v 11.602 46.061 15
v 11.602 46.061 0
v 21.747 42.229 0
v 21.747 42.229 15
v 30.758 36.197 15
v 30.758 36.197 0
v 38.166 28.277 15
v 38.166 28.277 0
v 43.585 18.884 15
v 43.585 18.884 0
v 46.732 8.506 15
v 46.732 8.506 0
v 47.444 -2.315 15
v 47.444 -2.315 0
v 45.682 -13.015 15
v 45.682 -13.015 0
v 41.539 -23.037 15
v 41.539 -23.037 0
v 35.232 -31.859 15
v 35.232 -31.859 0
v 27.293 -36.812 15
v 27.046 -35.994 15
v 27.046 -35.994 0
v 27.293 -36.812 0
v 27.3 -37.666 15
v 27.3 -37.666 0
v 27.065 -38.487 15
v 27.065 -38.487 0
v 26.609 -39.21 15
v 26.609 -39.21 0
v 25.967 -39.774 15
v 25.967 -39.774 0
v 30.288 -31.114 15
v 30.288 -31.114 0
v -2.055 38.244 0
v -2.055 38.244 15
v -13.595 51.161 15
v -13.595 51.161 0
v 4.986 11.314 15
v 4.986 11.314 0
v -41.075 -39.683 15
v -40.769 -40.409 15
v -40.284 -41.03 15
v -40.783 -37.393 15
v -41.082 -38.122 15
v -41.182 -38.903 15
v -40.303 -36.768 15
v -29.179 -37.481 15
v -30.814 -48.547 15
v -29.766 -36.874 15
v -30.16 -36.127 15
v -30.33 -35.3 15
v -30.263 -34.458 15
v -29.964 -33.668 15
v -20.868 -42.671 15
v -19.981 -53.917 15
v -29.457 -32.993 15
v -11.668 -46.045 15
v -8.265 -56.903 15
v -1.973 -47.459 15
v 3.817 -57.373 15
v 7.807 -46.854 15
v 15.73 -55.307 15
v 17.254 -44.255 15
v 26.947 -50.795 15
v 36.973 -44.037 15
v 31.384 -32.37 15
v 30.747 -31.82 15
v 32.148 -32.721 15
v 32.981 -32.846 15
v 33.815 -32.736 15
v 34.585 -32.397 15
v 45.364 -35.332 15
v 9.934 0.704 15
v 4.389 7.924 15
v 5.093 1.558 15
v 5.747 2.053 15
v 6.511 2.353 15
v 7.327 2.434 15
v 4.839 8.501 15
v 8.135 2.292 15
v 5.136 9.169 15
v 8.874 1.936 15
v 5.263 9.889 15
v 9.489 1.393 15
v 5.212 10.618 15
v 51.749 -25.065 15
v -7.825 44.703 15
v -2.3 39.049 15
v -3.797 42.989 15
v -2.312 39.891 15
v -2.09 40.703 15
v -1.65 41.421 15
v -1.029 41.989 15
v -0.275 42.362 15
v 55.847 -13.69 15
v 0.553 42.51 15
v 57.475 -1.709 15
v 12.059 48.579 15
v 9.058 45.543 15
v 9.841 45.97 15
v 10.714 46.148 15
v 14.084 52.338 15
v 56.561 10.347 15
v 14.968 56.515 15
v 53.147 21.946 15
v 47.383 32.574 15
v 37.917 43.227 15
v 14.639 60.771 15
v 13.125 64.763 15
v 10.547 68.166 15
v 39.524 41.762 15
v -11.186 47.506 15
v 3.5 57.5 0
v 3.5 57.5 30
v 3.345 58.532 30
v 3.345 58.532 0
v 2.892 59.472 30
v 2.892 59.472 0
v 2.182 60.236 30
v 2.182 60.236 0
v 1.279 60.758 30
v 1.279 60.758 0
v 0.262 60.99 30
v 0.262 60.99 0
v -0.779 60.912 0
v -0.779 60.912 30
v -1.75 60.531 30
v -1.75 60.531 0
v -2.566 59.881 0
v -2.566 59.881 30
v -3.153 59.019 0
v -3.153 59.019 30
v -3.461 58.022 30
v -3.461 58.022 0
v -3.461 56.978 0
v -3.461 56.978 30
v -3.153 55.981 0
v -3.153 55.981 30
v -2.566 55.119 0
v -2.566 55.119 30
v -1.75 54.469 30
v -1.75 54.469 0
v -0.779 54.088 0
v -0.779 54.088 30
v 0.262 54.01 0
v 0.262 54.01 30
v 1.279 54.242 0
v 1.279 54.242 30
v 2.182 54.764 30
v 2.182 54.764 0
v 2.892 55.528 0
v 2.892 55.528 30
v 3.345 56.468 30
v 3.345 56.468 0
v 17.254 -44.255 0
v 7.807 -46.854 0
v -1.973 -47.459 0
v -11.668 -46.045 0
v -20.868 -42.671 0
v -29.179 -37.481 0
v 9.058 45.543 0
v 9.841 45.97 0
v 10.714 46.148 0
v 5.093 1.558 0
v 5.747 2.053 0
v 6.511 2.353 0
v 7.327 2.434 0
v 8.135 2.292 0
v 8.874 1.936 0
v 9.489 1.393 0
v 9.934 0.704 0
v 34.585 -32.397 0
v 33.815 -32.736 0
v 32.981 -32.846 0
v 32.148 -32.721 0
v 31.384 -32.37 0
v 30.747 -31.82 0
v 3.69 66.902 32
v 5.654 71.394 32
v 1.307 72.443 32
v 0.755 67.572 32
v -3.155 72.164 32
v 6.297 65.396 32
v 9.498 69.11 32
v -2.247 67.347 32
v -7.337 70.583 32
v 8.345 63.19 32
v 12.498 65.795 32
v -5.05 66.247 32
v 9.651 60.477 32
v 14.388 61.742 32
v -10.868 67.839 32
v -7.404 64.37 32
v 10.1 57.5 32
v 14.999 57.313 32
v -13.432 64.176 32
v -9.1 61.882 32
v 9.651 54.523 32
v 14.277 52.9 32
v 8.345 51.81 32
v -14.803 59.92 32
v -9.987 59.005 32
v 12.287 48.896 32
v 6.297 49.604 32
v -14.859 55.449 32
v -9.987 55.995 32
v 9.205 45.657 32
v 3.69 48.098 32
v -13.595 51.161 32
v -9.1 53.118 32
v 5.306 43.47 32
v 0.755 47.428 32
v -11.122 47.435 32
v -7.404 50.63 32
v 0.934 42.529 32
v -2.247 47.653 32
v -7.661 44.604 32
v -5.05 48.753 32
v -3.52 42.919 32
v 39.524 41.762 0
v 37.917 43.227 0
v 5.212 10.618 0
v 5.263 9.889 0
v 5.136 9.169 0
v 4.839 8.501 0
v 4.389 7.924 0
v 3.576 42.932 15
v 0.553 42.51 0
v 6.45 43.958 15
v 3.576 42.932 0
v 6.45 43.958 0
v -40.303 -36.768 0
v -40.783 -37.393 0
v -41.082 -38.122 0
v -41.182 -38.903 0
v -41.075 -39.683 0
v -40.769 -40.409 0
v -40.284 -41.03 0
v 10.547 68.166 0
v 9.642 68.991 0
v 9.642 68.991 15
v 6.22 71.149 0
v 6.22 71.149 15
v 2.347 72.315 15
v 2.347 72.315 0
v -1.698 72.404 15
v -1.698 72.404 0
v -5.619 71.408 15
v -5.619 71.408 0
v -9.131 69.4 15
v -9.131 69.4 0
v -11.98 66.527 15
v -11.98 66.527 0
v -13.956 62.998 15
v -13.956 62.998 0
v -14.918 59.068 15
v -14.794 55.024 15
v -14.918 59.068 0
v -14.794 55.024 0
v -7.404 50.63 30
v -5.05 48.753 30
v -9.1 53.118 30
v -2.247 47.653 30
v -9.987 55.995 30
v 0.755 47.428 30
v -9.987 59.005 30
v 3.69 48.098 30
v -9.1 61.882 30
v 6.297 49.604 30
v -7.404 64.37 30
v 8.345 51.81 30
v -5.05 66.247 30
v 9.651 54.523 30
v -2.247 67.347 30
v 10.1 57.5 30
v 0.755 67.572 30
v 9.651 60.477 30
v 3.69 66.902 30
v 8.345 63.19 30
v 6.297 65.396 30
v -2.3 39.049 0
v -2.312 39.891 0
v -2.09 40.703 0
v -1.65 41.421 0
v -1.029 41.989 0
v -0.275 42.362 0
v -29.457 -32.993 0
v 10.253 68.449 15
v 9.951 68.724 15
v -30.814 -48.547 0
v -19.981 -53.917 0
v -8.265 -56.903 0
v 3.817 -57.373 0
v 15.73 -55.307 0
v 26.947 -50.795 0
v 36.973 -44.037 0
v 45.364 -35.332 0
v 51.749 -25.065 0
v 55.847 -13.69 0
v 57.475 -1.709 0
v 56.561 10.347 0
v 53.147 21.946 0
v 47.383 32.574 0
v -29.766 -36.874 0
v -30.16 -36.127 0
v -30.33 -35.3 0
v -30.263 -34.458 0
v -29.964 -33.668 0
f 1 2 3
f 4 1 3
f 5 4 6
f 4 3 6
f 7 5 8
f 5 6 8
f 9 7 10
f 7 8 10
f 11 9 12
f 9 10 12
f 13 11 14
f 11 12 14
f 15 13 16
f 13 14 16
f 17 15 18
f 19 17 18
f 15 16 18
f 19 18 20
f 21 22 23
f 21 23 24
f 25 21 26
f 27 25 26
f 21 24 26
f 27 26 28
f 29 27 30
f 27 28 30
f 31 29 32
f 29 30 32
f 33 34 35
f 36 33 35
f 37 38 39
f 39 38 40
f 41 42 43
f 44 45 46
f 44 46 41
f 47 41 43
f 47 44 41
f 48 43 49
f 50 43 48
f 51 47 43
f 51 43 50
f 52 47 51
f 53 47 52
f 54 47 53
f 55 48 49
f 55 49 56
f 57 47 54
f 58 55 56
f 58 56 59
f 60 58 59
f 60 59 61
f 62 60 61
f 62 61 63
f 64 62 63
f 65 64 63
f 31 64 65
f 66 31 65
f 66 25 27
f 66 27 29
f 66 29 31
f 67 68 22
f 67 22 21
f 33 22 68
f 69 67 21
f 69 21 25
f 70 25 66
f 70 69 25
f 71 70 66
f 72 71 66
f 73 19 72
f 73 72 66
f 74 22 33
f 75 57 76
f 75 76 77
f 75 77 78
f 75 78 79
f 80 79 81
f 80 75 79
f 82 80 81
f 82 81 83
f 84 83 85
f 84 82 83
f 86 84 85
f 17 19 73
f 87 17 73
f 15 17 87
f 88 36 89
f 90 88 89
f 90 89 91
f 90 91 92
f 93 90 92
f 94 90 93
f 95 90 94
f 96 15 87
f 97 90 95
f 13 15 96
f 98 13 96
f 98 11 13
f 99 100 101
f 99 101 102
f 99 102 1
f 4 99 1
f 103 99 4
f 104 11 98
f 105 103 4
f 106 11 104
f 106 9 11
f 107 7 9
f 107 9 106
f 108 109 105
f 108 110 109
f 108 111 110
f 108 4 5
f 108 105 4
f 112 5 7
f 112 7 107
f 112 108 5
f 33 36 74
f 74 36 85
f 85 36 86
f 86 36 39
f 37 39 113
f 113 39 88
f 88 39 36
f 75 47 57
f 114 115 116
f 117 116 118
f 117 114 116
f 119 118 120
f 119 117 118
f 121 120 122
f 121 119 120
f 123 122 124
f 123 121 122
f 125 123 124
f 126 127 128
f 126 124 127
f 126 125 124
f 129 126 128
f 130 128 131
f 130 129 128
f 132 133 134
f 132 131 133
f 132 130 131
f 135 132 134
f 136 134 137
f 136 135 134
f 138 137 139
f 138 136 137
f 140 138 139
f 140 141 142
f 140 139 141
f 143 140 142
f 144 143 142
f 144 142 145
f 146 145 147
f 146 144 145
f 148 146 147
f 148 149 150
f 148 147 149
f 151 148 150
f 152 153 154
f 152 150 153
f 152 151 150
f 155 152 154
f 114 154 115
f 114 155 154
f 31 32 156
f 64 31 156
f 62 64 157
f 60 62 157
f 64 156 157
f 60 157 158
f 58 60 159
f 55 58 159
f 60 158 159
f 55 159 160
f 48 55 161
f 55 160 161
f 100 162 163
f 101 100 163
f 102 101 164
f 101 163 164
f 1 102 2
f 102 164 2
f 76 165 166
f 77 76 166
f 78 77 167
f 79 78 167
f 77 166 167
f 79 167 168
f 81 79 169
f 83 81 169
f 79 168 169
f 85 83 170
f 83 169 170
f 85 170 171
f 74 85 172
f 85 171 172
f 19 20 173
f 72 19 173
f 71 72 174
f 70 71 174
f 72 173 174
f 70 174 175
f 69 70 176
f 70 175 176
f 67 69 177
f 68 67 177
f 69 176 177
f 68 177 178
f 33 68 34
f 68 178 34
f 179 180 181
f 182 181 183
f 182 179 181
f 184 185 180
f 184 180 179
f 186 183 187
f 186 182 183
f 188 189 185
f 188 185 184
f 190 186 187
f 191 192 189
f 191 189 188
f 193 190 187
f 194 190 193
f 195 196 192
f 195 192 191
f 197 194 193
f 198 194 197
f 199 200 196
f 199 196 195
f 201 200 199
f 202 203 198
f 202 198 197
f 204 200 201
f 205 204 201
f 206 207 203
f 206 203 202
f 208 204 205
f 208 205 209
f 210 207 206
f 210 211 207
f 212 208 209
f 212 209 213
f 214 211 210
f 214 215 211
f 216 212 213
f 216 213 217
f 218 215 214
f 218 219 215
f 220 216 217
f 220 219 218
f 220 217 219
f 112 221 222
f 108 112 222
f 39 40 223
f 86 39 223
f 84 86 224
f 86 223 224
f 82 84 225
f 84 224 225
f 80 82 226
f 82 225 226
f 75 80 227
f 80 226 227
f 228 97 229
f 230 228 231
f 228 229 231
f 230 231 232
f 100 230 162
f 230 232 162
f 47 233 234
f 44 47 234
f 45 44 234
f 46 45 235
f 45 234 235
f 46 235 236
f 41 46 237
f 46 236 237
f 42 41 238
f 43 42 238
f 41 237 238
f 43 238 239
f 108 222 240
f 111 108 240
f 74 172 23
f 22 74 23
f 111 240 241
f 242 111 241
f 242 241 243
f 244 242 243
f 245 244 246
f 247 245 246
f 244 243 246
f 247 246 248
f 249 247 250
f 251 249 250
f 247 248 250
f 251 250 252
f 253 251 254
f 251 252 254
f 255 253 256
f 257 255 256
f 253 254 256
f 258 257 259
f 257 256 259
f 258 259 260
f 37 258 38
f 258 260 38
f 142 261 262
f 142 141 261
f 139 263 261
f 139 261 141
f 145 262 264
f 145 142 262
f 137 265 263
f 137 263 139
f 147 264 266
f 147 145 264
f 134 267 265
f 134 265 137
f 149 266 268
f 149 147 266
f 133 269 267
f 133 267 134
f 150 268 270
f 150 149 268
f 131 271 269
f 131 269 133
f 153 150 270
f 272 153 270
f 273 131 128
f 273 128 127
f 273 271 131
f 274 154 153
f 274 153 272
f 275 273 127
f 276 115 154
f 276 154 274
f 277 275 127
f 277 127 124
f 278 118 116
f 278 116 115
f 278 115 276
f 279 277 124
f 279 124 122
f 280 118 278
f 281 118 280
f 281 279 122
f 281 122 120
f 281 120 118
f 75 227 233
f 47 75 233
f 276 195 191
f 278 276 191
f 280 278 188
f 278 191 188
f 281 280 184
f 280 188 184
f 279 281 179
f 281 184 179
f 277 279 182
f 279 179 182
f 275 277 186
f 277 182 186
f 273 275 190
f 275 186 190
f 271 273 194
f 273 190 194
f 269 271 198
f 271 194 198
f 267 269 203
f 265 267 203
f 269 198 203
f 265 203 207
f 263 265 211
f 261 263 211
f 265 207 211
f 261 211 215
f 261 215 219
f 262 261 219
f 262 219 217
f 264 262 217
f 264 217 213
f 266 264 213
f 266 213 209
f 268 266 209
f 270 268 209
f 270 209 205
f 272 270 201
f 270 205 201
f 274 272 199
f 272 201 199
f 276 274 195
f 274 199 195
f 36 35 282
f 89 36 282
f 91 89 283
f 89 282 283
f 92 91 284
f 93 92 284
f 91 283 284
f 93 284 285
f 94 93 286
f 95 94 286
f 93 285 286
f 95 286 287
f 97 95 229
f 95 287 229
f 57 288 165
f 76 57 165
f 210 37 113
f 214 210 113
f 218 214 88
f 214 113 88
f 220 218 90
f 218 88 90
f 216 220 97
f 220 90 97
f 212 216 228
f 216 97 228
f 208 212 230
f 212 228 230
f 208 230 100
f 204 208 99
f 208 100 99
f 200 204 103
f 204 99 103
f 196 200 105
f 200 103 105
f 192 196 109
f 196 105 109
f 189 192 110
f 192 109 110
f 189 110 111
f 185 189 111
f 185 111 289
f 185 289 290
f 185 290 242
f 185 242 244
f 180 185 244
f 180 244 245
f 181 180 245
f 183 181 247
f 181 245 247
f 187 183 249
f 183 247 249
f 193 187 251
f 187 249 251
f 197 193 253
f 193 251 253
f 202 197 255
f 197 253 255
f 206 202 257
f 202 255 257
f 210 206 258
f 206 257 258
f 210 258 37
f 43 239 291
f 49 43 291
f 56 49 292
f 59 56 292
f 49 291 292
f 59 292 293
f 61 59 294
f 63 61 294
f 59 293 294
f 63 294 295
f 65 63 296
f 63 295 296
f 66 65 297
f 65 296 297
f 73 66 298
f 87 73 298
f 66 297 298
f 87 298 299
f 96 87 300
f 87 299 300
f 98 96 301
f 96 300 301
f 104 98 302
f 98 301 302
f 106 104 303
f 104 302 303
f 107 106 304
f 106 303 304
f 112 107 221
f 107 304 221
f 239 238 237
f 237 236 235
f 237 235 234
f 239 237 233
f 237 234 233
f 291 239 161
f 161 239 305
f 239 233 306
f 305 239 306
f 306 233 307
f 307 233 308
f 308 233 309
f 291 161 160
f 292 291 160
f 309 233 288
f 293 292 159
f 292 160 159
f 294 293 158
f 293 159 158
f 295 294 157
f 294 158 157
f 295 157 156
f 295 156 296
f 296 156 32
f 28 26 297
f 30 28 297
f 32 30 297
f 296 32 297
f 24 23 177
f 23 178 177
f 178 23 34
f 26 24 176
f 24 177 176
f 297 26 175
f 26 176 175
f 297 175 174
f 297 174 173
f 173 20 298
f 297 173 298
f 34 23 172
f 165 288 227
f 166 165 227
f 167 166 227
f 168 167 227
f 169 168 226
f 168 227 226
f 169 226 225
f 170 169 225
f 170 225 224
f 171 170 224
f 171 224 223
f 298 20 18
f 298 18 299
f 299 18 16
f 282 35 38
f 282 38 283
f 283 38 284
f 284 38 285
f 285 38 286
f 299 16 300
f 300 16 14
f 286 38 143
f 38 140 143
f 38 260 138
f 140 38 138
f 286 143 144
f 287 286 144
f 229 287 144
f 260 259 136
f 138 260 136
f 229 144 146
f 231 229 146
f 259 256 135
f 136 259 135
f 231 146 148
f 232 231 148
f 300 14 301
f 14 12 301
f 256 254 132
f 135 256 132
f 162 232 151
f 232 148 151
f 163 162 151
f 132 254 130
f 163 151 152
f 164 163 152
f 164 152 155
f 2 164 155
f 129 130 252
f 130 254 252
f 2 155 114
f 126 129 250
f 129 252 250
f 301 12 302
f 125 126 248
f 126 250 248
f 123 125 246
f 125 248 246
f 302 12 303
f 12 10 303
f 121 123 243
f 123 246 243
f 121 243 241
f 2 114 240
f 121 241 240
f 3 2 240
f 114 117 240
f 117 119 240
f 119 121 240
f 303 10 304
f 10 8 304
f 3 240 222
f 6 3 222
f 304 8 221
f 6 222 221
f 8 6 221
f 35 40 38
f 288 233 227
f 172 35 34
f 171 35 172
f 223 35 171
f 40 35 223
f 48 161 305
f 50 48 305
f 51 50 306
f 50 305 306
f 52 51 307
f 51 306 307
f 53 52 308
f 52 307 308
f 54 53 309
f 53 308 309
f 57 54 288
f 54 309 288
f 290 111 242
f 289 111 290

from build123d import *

# Parameters (mm, degrees)
EXTRUDE_1_DEPTH     = 15
SKETCH_6_R          = 3.5
CUT_EXTRUDE_2_DEPTH = 15
SKETCH_9_R          = 15
SKETCH_9_R_2        = 3.5
EXTRUDE_2_DEPTH     = 17
SKETCH_10_R         = 10.1
CUT_EXTRUDE_5_DEPTH = 2


with BuildPart() as part:
    # ｽｹｯﾁ1 → ﾎﾞｽ - 押し出し1 (new body)
    with BuildSketch(Plane.XY):
        with BuildLine():
            Line((10.546944731, 68.165925034), (9.641814145, 68.990666647))
            ThreePointArc((9.641814145, 68.990666647), (-9.131421435, 69.400300104), (-13.594616806, 51.160726074))
            Line((-13.594616806, 51.160726074), (4.986432096, 11.313538113))
            ThreePointArc((4.986432096, 11.313538113), (5.221931994, 9.524738795), (4.388829079, 7.924362985))
            Line((4.388829079, 7.924362985), (-40.303464689, -36.767930783))
            ThreePointArc((-40.303464689, -36.767930783), (-41.182112782, -38.903012739), (-40.283913759, -41.029943849))
            ThreePointArc((-40.283913759, -41.029943849), (41.397896806, -39.905690573), (39.524106652, 41.762363359))
            Line((39.524106652, 41.762363359), (37.916838192, 43.226882625))
            Line((37.916838192, 43.226882625), (10.546944731, 68.165925034))
        make_face()
        with BuildLine():
            ThreePointArc((5.093338956, 1.55780505), (7.735603832, 2.390907965), (9.933582661, 0.704339492))
            Line((9.933582661, 0.704339492), (27.046217634, -35.993824637))
            ThreePointArc((27.046217634, -35.993824637), (27.212084573, -38.085077821), (25.967336583, -39.773702754))
            ThreePointArc((25.967336583, -39.773702754), (-1.972837213, -47.459012983), (-29.17877254, -37.481318454))
            ThreePointArc((-29.17877254, -37.481318454), (-30.330146685, -35.299826939), (-29.457223039, -32.992756945))
            Line((-29.457223039, -32.992756945), (5.093338956, 1.55780505))
        make_face(mode=Mode.SUBTRACT)
        with BuildLine():
            ThreePointArc((35.231836325, -31.858557864), (32.560090836, -32.813013733), (30.287744354, -31.114293205))
            Line((30.287744354, -31.114293205), (-2.054746852, 38.244403012))
            ThreePointArc((-2.054746852, 38.244403012), (-1.895310582, 41.077194163), (0.553480425, 42.510214831))
            ThreePointArc((0.553480425, 42.510214831), (5.039223996, 43.371793408), (9.057681155, 45.543478261))
            ThreePointArc((9.057681155, 45.543478261), (10.270904088, 46.091905397), (11.601973614, 46.061309233))
            ThreePointArc((11.601973614, 46.061309233), (45.455779175, 13.784851815), (35.231836325, -31.858557864))
        make_face(mode=Mode.SUBTRACT)
    extrude(amount=EXTRUDE_1_DEPTH)

    # ｽｹｯﾁ6 → ｶｯﾄ - 押し出し2 (cut)
    with BuildSketch(Plane.XY.offset(15)):
        with Locations((0, 57.5)):
            Circle(SKETCH_6_R)
    extrude(amount=-CUT_EXTRUDE_2_DEPTH, mode=Mode.SUBTRACT)

    # ｽｹｯﾁ9 → ﾎﾞｽ - 押し出し2 (add)
    with BuildSketch(Plane.XY.offset(15)):
        with Locations(Location((0, 57.5, 0), (0, 0, 205))):
            Circle(SKETCH_9_R)
        with Locations((0, 57.5)):
            Circle(SKETCH_9_R_2, mode=Mode.SUBTRACT)
    extrude(amount=EXTRUDE_2_DEPTH)

    # ｽｹｯﾁ10 → ｶｯﾄ - 押し出し5 (cut)
    with BuildSketch(Plane.XY.offset(32)):
        with Locations((0, 57.5)):
            Circle(SKETCH_10_R)
    extrude(amount=-CUT_EXTRUDE_5_DEPTH, mode=Mode.SUBTRACT)


solid = part.part
